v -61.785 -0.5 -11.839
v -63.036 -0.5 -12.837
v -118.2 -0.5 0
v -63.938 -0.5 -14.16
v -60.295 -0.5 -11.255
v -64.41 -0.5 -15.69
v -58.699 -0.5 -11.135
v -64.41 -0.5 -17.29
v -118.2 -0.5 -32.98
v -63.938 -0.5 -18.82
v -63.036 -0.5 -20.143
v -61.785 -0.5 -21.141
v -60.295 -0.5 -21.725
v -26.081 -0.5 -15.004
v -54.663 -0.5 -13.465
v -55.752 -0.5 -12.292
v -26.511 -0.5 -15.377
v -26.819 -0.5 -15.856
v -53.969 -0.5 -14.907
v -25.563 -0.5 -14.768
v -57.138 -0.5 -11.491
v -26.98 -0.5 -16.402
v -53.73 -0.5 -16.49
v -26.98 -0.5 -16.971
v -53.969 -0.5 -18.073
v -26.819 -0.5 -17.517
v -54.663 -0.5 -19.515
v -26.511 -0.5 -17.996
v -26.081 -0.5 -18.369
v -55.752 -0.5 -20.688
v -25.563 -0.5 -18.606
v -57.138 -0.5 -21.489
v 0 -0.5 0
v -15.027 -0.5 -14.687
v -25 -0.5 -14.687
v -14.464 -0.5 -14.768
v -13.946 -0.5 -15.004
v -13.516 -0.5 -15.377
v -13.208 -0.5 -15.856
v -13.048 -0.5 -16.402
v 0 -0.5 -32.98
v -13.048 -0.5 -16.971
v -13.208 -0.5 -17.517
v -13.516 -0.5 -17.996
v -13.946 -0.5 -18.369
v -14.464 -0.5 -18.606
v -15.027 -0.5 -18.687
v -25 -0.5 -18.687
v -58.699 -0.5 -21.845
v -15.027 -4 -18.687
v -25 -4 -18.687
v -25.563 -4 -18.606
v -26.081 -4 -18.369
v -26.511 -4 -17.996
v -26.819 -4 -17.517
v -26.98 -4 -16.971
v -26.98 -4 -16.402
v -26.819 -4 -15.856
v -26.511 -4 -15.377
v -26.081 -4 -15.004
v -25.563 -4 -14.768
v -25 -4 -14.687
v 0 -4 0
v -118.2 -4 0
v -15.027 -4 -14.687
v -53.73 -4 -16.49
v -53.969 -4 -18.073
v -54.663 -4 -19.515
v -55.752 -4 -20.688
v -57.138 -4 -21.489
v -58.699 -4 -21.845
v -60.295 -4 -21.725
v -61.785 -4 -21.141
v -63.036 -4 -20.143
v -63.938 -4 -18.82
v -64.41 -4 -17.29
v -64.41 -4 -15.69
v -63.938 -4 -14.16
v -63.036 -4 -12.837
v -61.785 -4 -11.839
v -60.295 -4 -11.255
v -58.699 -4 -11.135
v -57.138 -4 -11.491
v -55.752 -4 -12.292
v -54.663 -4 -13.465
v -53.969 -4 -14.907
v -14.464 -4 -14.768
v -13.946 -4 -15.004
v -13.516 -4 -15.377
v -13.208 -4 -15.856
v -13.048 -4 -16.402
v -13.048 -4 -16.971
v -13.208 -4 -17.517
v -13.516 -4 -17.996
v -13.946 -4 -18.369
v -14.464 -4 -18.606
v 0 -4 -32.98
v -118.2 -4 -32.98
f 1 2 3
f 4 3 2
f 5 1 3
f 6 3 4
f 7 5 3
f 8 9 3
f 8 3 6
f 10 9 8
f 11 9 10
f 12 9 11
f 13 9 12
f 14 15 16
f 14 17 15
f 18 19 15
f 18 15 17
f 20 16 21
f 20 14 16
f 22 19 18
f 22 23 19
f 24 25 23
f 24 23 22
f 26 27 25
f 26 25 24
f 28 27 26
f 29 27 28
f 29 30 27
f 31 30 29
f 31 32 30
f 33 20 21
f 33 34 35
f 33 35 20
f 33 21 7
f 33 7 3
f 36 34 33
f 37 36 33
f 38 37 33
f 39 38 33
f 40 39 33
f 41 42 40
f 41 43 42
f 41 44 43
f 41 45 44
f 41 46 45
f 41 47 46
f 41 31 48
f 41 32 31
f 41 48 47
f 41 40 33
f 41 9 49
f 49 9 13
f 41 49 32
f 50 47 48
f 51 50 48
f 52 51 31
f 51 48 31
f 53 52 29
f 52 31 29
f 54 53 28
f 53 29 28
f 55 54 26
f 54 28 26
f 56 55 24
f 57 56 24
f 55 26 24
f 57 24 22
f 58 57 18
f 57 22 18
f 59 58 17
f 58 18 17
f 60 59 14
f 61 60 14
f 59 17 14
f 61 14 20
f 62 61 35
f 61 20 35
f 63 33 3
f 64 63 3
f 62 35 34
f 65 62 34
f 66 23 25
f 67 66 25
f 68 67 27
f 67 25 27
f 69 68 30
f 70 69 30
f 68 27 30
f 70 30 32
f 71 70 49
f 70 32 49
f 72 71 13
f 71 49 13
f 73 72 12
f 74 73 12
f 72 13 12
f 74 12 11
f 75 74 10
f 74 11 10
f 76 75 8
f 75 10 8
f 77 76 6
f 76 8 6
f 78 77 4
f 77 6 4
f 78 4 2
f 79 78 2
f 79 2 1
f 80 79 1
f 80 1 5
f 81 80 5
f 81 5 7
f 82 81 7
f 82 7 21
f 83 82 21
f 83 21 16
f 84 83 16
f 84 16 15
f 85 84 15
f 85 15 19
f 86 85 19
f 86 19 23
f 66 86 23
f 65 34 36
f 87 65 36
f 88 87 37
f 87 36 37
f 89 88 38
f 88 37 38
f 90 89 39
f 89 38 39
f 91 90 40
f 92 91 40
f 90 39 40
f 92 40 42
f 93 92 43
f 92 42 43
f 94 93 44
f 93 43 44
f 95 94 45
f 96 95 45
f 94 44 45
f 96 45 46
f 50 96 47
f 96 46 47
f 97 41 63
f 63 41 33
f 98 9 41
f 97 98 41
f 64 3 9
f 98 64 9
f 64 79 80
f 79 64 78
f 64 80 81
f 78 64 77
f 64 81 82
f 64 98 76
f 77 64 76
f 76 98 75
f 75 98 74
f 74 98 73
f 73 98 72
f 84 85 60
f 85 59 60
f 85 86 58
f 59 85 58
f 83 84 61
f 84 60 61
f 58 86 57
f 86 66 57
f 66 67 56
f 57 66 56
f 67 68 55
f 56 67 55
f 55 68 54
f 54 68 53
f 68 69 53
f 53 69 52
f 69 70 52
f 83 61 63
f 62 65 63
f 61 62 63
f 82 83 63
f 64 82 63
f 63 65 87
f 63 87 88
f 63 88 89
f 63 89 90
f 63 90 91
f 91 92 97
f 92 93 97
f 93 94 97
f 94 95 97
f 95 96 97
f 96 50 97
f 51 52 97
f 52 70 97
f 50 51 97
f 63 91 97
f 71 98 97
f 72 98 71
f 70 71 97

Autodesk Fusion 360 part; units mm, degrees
sketch "Sketch1" plane through (0, 0, 0) normal (0, 1, 0) x (1, 0, 0)
  line L0 (0, 0) -> (-118.2, 0)
  line L1 (-118.2, 0) -> (-118.2, 32.98)
  line L2 (-118.2, 32.98) -> (0, 32.98)
  line L3 (0, 32.98) -> (0, 0)
  line L4 (0, 0) -> (0, 16.49)
  line L5 (-118.2, 16.49) -> (0, 16.49)
  circle A0 centre (-59.1, 16.49) radius 5.37
  point P0 (-59.1, 16.49)
  dimension "d1" = 118.2
  dimension "d2" = 32.98
  dimension "d3" = 10.74
  dimension "d4" = 59.1
sketch "Sketch2" plane through (0, 0, 0) normal (0, 1, 0) x (1, 0, 0)
  line L0 (-15.0272, 18.6866) -> (-25, 18.6866)
  arc A0 (-25, 18.6866) -> (-25, 14.6866) centre (-25, 16.6866) ccw
  line L1 (-25, 14.6866) -> (-15.0272, 14.6866)
  arc A1 (-15.0272, 14.6866) -> (-15.0272, 18.6866) centre (-15.0272, 16.6866) ccw
  line L2 (-15.0272, 16.6866) -> (-25, 16.6866) construction
  dimension "d5" = 4
extrude "Extrude1" add sketch "Sketch1" against normal blind 4 contours L0 L1 L3 L4 L5 A0 | L1 L2 L3 L5 A0
extrude "Extrude2" cut sketch "Sketch2" against normal blind 4
move_face "OffsetFaces1" offset -0.5 1 faces at (-100.29, 0, -16.49)
sketch "Sketch3" plane through (0, 0, 0) normal (0, 1, 0) x (1, 0, 0)
sketch "Sketch4" plane through (0, 0, 0) normal (0, 1, 0) x (1, 0, 0)
